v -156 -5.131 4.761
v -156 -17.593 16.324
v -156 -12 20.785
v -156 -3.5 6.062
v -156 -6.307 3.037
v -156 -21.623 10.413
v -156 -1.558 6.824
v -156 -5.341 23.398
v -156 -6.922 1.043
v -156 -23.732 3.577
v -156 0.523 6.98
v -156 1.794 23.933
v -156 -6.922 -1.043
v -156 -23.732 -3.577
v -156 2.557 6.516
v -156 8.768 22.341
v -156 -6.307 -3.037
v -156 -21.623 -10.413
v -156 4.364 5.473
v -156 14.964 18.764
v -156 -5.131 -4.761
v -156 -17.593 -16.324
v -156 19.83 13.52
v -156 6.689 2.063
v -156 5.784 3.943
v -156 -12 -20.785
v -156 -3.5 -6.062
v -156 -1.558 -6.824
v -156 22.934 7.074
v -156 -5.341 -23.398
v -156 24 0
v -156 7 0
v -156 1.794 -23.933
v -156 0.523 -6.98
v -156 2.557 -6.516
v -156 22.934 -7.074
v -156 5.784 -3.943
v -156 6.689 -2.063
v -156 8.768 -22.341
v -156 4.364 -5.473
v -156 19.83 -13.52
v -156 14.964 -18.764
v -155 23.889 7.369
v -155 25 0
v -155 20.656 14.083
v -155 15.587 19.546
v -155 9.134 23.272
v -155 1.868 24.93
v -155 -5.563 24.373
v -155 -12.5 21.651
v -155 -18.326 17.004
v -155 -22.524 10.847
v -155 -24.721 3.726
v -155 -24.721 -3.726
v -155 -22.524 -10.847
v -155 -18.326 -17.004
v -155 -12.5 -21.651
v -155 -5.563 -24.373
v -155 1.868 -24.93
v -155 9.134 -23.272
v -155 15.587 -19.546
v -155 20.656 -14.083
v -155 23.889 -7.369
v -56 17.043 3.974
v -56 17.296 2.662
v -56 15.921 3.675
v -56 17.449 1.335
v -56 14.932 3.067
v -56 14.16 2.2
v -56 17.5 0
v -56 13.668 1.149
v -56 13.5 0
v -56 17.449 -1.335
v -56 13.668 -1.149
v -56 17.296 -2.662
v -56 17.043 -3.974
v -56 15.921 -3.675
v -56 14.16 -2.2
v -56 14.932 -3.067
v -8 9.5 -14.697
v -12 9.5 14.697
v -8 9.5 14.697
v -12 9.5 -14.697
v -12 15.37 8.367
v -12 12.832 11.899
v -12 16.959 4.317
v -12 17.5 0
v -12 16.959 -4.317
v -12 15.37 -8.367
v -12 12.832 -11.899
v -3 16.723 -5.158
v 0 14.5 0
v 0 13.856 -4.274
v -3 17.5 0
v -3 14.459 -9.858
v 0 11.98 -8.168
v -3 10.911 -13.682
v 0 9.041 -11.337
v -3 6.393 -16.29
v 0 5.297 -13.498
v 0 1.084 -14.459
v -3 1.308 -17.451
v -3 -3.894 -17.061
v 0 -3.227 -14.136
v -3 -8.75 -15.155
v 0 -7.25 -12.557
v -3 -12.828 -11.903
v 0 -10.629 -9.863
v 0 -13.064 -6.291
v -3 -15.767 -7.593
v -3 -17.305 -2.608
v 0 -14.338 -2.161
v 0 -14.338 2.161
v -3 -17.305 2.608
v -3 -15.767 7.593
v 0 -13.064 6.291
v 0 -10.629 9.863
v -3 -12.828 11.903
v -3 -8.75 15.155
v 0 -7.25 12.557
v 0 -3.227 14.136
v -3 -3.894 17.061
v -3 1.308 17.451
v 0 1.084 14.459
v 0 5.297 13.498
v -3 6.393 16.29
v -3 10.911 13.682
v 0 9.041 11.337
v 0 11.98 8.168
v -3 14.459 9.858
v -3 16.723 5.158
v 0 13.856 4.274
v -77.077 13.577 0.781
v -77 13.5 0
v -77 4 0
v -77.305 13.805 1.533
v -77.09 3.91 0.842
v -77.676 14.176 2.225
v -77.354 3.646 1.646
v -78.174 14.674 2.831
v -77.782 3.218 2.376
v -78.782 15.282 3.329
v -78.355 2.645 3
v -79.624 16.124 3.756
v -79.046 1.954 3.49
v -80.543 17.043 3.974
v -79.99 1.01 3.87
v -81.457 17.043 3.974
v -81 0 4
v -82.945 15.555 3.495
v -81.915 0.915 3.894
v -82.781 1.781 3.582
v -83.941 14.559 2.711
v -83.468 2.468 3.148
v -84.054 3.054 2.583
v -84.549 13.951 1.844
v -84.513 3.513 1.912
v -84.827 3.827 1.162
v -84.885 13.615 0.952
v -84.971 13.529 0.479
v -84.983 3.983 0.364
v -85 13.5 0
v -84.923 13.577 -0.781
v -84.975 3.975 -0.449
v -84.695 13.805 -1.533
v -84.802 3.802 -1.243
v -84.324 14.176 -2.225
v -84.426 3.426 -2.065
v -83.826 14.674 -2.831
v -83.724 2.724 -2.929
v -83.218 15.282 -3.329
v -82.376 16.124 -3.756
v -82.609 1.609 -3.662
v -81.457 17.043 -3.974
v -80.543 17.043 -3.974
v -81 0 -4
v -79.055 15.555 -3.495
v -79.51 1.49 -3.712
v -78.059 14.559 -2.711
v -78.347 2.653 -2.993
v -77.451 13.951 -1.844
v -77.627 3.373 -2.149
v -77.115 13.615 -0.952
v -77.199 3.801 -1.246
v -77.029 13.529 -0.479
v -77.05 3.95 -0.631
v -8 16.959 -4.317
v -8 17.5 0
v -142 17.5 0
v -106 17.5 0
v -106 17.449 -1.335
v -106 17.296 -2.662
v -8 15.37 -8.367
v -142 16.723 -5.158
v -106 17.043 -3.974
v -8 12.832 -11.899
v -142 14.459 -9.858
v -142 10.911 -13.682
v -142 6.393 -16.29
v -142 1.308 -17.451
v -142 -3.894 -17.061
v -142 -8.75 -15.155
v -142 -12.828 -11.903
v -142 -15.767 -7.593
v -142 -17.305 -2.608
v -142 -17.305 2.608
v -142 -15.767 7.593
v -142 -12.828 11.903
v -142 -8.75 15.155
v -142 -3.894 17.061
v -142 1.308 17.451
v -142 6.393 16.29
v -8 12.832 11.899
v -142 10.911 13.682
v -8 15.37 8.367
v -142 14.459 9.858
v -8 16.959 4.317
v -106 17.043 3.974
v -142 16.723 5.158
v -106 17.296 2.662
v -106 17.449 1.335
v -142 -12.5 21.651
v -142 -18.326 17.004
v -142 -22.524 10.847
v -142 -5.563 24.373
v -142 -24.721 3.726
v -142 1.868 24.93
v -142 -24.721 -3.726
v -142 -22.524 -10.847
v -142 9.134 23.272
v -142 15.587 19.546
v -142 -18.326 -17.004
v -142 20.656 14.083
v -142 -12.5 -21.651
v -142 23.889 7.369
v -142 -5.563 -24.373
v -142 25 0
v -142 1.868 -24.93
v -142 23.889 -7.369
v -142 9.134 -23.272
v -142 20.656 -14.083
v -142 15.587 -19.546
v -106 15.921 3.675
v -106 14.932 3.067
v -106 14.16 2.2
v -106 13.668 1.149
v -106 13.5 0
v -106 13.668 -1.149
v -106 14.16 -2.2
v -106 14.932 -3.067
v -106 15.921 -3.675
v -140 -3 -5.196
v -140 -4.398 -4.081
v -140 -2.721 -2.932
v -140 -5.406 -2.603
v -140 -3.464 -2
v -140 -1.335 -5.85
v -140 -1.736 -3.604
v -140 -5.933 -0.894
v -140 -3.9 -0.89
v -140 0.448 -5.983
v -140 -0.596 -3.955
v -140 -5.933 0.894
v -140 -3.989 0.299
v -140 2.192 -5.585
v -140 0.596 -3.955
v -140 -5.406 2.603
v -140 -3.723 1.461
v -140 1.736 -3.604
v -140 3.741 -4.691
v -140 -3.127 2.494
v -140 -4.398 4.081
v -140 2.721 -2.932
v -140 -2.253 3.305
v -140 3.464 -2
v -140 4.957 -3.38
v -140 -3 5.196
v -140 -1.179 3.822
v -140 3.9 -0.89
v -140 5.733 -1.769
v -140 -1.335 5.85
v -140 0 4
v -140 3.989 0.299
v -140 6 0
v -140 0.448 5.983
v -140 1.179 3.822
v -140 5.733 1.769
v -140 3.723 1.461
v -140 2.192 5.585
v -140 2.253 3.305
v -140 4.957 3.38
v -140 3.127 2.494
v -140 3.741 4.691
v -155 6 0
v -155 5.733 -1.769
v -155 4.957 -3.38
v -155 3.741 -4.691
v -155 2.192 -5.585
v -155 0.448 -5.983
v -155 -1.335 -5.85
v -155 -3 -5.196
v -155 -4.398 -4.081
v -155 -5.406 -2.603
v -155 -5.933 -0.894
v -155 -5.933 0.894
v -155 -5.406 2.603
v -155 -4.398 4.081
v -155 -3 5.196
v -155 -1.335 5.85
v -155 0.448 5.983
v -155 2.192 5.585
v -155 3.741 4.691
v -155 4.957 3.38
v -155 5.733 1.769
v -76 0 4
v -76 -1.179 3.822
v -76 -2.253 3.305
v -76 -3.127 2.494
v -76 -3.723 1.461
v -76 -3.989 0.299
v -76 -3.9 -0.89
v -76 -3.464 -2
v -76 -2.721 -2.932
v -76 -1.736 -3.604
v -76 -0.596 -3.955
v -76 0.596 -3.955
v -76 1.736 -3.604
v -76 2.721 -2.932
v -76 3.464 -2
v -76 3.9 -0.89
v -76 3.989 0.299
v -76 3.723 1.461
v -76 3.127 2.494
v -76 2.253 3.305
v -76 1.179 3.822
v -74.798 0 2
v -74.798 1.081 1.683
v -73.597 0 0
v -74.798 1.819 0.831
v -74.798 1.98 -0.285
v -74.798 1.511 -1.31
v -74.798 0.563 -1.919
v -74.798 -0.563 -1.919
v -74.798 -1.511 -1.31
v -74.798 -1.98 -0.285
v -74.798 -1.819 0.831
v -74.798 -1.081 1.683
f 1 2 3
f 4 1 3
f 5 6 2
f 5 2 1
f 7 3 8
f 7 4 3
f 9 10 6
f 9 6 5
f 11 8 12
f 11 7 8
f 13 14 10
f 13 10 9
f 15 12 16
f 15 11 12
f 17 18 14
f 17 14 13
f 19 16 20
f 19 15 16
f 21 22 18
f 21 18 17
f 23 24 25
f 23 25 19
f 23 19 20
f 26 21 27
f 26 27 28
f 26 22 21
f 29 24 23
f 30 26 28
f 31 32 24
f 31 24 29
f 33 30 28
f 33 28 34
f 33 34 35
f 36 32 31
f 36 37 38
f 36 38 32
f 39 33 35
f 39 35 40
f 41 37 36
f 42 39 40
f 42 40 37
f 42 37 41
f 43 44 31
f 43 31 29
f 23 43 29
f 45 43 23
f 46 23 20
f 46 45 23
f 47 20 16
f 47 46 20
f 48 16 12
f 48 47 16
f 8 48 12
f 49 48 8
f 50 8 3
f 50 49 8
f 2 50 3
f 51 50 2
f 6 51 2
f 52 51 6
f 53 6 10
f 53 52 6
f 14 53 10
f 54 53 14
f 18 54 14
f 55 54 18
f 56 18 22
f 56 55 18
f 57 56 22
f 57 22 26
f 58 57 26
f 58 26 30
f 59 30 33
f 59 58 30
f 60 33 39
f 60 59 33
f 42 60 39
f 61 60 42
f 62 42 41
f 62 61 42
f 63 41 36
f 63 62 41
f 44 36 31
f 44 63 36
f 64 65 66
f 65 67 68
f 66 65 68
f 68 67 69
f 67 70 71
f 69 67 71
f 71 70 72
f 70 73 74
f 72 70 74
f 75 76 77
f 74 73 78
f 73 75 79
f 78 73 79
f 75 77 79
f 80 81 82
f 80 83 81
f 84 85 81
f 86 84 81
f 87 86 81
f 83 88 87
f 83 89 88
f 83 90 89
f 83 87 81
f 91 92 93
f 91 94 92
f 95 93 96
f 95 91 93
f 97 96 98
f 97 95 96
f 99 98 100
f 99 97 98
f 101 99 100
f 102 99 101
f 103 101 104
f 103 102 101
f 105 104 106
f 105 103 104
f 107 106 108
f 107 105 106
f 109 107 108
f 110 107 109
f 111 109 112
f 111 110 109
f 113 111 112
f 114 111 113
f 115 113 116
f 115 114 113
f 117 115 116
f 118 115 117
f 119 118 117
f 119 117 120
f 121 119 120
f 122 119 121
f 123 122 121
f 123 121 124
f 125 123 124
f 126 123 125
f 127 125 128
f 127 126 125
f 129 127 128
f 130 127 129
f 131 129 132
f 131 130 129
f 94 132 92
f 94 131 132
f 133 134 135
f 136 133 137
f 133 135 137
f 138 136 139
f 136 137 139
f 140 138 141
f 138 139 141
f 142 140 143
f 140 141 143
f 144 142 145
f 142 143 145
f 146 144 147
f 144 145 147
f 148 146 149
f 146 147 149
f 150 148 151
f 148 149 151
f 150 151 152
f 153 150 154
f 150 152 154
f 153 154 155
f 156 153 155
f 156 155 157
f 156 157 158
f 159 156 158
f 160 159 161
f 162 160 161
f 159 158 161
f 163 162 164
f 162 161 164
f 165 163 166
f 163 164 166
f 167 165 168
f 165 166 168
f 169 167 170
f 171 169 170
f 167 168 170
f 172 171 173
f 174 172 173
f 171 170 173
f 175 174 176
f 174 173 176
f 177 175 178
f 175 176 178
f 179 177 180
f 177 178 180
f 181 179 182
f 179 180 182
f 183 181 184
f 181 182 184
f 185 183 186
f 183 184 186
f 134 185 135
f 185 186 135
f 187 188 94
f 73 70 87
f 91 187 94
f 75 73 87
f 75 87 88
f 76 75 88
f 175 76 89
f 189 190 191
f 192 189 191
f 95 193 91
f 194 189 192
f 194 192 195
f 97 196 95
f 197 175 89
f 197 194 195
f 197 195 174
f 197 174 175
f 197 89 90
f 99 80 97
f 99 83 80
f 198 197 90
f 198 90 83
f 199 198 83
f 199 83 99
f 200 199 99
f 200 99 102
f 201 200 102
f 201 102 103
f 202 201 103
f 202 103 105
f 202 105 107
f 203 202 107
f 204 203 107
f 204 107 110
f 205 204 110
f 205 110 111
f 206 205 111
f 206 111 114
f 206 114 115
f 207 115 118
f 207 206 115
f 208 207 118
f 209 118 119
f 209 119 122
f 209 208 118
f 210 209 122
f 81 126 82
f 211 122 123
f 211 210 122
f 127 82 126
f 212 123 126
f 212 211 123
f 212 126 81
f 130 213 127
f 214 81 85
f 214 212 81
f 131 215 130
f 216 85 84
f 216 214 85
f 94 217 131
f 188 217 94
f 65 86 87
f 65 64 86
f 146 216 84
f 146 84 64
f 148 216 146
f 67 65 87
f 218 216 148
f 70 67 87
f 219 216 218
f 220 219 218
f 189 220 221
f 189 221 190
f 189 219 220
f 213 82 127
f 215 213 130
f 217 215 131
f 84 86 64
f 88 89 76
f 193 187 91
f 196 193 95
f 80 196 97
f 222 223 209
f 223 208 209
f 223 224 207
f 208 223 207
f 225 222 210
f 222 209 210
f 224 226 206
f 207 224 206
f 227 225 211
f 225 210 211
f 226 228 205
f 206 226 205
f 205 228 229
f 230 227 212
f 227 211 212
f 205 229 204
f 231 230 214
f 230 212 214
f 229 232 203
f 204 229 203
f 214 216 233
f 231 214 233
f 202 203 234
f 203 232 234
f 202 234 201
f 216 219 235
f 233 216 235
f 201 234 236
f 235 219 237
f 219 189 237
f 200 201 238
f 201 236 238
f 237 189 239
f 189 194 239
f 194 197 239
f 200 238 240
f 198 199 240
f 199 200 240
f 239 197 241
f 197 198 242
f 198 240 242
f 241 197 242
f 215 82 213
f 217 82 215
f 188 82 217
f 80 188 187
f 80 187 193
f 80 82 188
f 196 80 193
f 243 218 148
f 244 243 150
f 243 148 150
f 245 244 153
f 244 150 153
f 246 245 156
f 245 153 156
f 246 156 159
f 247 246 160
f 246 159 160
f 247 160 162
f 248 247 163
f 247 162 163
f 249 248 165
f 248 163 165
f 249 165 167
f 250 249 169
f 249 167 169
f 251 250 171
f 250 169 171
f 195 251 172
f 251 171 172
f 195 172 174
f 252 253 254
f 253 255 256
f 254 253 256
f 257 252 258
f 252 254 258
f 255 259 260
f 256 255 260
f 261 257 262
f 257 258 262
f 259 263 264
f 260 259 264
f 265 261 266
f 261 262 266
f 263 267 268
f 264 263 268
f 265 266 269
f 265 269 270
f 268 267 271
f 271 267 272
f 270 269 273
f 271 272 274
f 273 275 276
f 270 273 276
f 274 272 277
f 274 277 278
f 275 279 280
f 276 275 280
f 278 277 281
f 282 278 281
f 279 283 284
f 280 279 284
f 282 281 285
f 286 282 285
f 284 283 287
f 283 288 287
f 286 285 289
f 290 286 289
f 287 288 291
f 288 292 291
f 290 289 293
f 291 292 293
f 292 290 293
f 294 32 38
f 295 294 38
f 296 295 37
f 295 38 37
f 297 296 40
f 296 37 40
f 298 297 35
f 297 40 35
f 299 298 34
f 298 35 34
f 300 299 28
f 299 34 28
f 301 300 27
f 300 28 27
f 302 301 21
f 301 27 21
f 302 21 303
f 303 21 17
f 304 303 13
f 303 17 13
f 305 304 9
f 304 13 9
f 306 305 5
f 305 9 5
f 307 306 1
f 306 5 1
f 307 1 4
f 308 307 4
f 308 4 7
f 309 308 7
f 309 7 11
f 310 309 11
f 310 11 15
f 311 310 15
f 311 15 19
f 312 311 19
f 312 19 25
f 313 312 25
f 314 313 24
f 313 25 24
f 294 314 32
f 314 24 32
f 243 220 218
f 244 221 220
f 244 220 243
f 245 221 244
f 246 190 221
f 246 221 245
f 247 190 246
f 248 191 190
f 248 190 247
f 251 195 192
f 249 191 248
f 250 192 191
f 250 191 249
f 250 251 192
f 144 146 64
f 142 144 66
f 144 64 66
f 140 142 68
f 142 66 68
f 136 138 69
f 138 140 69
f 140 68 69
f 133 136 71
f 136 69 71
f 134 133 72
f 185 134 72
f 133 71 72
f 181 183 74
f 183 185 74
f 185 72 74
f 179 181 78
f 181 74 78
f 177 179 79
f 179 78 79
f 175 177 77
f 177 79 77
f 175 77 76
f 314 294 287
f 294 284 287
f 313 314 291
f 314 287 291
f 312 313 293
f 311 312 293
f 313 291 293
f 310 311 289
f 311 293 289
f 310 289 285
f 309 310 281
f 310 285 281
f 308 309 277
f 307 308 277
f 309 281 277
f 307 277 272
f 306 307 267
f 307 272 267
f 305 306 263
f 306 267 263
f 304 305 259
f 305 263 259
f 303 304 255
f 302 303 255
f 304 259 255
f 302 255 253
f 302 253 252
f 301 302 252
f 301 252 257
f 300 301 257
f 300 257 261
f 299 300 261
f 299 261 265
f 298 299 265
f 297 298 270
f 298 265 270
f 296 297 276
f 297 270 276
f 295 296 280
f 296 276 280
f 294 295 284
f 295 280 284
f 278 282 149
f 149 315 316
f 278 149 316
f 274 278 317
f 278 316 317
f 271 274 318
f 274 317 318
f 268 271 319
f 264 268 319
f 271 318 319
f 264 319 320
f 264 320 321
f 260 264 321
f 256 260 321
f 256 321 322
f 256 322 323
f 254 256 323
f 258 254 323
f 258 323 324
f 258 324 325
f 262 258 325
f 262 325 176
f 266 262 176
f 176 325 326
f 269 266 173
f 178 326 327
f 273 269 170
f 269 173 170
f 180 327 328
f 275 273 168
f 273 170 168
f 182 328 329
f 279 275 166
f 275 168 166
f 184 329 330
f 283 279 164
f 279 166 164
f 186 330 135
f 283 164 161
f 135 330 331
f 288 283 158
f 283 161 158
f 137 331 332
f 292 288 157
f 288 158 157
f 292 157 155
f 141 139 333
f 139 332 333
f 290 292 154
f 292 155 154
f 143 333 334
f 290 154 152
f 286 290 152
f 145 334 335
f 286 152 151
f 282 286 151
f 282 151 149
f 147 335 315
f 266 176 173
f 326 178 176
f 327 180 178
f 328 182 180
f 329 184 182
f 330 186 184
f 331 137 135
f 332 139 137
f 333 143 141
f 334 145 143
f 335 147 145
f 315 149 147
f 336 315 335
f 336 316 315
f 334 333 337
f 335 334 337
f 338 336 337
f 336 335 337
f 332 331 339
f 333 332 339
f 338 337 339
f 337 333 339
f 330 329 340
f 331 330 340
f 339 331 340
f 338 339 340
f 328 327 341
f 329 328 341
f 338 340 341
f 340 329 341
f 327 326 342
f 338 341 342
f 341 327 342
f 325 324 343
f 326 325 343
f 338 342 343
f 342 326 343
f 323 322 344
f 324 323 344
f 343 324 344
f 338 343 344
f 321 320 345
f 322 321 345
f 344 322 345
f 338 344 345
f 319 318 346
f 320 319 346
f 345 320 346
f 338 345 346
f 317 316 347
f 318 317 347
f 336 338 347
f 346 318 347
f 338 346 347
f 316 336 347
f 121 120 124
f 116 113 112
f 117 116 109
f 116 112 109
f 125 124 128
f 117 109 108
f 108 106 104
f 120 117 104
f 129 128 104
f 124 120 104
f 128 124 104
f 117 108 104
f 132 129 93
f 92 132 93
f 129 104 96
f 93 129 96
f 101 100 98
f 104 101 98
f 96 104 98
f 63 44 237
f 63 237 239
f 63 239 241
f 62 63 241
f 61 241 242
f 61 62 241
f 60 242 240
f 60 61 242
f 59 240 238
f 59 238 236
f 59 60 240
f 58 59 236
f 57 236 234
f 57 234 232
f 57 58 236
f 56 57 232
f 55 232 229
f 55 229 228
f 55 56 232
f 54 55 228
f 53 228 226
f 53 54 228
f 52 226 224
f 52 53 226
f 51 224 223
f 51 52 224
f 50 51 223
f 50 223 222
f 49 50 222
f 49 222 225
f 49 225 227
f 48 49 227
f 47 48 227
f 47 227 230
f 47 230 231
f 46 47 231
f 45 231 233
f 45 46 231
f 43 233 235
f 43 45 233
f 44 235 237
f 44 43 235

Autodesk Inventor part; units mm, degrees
ref_plane "YZ Plane" through (0, 0, 0) normal (1, 0, 0) x (0, 1, 0)
ref_plane "XZ Plane" through (0, 0, 0) normal (0, 1, 0) x (-1, 0, 0)
ref_plane "XY Plane" through (0, 0, 0) normal (0, 0, 1) x (1, 0, 0)
sketch "Sketch1" plane through (0, 0, 0) normal (0, 0, 1) x (1, 0, 0)
  line L0 (0, 0) -> (-156, 0)
  line L1 (0, 0) -> (0, 14.5)
  line L2 (0, 14.5) -> (-3, 17.5)
  line L3 (-3, 17.5) -> (-142, 17.5)
  line L4 (-142, 17.5) -> (-142, 25)
  line L5 (-142, 25) -> (-155, 25)
  line L6 (-155, 25) -> (-156, 24)
  line L7 (-156, 24) -> (-156, 0)
  dimension "d0" = 35
  dimension "d1" = 3
  dimension "d2" = 45
  dimension "d4" = 14
  dimension "d5" = 156
  dimension "d6" = 50
  dimension "d7" = 45
  dimension "d8" = 1
revolve "Revolution1" add sketch "Sketch1" angle 360 about axis through (0, 0, 0) along (-1, 0, 0)
sketch "Sketch2" plane through (-156, 0, 0) normal (-1, 0, 0) x (0, 0, 1)
  circle A0 centre (0, 0) radius 24 projected
  point P0 (0, 0)
hole "Hole1" at (-156, 0, 0) direction (1, 0, 0) diameter 8 depth 80 tip angle 118
sketch "Sketch3" plane through (0, 0, 0) normal (0, 0, 1) x (1, 0, 0)
  line L0 (-156, -24) -> (-156, 24) projected
  line L1 (-156, 7) -> (-155, 6)
  line L2 (-155, 6) -> (-140, 6)
  line L3 (-140, 6) -> (-140, 4)
  line L4 (-76, 4) -> (-156, 4) projected
  line L5 (-156, 0) -> (-73.5966, 0)
  line L6 (-73.5966, 0) -> (-76, -4) projected
  point P0 (0, 0)
  dimension "d17" = 1
  dimension "d18" = 6
  dimension "d19" = 16
  dimension "d20" = 45
revolve "Revolution2" cut sketch "Sketch3" angle 360 about axis through (-156, 0, 0) along (1, 0, 0)
sketch "Sketch4" plane through (0, 0, 0) normal (0, 0, 1) x (1, 0, 0)
  line L0 (-142, 17.5) -> (-3, 17.5) projected
  line L1 (-12, 17.5) -> (-12, 9.5)
  line L2 (-12, 9.5) -> (-8, 9.5)
  line L3 (-8, 9.5) -> (-8, 17.5)
  line L4 (0, -14.5) -> (0, 14.5) projected
  point P0 (0, 0)
  dimension "d22" = 4
  dimension "d23" = 12
  dimension "d24" = 8
extrude "Extrusion1" cut sketch "Sketch4" along normal through all both and the other way through all
sketch "Sketch5" plane through (0, 0, 0) normal (0, 0, 1) x (1, 0, 0)
  line L0 (-76, 4) -> (-140, 4) projected
  line L1 (-81, 4) -> (-81, 17.5)
  line L2 (-142, 17.5) -> (-3, 17.5) projected
  line L3 (-77, 17.5) -> (-77, 4)
  line L4 (-156, -24) -> (-156, 24) projected
  line L5 (-76, -4) -> (-140, -4) projected
  line L6 (-81, 4) -> (-81, -4)
  line L7 (-76, 4) -> (-140, 4) projected
  line L8 (-77, 4) -> (-77, -4)
  line L9 (-81, 0) -> (-77, 0)
  line L10 (-77, 13.5) -> (-81, 13.5)
  point P0 (0, 0)
  dimension "d27" = 4
  dimension "d28" = 75
  dimension "d33" = 4
revolve "Revolution3" cut sketch "Sketch5" angle 360 about axis through (-81, 4, 0) along (0, 1, 0) contours L8 L9 L6 L0 | L0 L1 L10 L3 | L10 L1 L2 L3
sketch "Sketch6" plane through (0, 0, 0) normal (0, 0, 1) x (1, 0, 0)
  line L0 (-142, 17.5) -> (-3, 17.5) projected
  line L1 (-106, 17.5) -> (-106, 13.5)
  line L2 (-106, 13.5) -> (-81, 13.5)
  line L3 (-81, 13.5) -> (-56, 13.5)
  line L4 (-56, 13.5) -> (-56, 17.5)
  line L5 (-106, 17.5) -> (-56, 17.5)
  line L6 (-142, 17.5) -> (-3, 17.5) projected
  line L7 (-77, 4) -> (-81, 0) projected
  line L8 (-81, 17.5) -> (-81, 0)
  point P0 (0, 0)
  dimension "d30" = 50
  dimension "d31" = 4
revolve "Revolution4" cut sketch "Sketch6" angle 360 about axis through (-142, 17.5, 0) along (1, 0, 0)
properties part number "Ось" material "Steel, Cast"
